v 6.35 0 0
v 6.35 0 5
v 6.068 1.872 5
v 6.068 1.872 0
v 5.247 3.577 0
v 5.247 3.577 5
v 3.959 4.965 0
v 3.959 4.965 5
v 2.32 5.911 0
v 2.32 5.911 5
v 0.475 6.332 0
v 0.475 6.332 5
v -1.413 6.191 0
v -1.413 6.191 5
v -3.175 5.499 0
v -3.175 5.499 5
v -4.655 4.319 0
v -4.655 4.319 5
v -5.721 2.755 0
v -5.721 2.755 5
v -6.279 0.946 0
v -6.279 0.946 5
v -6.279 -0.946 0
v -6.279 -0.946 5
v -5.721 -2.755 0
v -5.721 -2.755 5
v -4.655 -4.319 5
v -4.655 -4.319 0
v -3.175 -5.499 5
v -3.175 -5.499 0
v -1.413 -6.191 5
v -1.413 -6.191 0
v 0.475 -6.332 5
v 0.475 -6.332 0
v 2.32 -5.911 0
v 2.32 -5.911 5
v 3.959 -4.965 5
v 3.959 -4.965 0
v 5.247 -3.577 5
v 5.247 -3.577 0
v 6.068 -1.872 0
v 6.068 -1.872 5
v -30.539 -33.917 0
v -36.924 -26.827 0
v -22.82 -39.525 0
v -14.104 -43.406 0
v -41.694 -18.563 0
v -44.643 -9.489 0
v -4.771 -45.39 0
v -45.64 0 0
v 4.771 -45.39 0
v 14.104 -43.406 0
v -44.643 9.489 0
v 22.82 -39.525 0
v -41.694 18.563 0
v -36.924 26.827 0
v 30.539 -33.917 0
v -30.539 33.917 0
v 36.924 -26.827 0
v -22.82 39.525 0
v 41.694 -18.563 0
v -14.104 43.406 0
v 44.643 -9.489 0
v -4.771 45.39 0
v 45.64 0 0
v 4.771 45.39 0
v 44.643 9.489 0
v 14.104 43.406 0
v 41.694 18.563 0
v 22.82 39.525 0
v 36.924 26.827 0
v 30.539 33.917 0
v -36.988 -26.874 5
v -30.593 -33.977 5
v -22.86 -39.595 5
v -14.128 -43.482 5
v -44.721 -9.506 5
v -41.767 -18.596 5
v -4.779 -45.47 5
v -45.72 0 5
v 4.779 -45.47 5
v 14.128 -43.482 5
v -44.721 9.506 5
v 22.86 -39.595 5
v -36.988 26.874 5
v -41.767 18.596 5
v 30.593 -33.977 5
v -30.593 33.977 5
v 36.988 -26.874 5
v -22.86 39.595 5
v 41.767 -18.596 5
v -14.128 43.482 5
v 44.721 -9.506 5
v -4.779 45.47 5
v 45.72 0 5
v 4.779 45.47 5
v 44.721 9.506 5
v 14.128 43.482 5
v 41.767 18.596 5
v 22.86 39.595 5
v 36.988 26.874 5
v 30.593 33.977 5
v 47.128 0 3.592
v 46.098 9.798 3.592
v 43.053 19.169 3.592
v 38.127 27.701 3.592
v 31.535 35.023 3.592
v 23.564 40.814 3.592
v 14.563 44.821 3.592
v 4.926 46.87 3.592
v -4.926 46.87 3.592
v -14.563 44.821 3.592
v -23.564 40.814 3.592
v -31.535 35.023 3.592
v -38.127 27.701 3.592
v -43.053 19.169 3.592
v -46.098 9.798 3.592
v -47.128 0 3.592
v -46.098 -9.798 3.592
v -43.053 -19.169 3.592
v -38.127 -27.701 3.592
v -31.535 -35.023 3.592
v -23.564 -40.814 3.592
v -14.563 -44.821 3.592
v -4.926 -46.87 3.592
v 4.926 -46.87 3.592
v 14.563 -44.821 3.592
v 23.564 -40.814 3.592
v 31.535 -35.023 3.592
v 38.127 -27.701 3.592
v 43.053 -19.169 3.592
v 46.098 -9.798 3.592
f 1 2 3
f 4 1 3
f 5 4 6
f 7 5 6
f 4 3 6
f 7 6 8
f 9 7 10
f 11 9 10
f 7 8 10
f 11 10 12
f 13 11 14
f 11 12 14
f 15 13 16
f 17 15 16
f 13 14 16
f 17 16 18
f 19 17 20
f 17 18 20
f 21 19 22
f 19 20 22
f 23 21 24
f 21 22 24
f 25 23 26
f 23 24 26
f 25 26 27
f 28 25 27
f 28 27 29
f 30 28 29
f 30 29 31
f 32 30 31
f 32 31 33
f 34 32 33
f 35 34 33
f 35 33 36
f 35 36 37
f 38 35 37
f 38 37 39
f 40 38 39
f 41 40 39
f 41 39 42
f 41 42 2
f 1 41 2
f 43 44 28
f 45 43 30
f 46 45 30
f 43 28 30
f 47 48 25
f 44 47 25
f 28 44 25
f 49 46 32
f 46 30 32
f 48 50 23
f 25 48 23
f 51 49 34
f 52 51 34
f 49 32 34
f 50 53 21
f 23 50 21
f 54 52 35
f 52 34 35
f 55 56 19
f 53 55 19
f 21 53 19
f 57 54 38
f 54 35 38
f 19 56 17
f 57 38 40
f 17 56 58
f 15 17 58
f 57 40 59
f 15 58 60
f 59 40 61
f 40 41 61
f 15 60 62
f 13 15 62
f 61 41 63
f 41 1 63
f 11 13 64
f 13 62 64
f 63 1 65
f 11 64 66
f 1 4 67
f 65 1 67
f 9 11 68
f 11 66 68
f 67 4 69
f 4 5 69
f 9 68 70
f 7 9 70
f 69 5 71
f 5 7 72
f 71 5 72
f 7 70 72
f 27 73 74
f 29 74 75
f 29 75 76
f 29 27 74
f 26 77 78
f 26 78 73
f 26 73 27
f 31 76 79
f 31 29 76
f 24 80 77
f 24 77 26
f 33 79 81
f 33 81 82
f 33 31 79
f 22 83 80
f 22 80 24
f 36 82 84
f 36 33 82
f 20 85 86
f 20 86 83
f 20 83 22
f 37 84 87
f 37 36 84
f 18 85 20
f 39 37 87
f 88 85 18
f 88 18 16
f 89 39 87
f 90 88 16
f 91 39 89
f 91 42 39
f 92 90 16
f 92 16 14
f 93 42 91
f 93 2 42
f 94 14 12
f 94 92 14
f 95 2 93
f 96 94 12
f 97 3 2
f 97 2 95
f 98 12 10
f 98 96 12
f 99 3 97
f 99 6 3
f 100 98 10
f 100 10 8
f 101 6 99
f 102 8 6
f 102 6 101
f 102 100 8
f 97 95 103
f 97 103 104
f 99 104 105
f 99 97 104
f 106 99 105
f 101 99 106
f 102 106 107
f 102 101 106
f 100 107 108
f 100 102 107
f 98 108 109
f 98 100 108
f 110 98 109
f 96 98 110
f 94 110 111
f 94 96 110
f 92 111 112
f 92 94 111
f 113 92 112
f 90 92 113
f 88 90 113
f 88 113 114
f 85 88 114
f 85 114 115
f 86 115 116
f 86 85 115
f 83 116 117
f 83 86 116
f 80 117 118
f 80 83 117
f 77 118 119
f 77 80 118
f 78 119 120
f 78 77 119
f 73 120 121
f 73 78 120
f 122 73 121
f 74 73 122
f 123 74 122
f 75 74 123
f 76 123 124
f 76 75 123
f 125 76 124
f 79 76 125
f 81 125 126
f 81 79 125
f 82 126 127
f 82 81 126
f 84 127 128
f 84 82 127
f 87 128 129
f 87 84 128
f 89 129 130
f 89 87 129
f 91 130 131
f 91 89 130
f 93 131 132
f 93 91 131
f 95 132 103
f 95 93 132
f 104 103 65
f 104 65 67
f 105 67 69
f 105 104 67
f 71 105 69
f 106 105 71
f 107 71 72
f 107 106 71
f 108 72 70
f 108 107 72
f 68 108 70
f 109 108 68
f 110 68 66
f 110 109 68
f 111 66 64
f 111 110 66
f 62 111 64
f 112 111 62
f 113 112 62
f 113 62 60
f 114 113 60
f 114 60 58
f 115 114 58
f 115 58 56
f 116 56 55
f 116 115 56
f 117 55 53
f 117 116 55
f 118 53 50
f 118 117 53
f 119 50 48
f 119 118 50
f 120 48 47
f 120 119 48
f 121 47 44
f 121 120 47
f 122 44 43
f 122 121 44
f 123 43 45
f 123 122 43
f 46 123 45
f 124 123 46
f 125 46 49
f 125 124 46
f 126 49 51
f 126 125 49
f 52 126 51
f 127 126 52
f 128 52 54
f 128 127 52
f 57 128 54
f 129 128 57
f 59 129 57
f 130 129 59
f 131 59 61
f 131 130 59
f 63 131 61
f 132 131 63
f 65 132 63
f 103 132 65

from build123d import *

# Parameters (mm, degrees)
F0_R     = 50.8
F1_DEPTH = 5
F2_R     = 6.35
F3_DEPTH = 5.001
F5_SIZE  = 5.08


# Not quite as in the source:
# - a fillet or chamfer that OpenCascade refuses, or shapes differently, is made with other operations: its cross-section is extruded or revolved along the edge and cut away or added


with BuildPart() as f1:
    # F0 (on Top) → F1 (new body)
    with BuildSketch(Plane.XY):
        Circle(F0_R)
    extrude(amount=F1_DEPTH)

    # F2 (on face) → F3 (cut, through all)
    with BuildSketch(Plane.XY.offset(5)):
        Circle(F2_R)
    extrude(amount=-F3_DEPTH, mode=Mode.SUBTRACT)

    # F4: chamfer of 5.08 on 1 edges, made by hand

    # F4_s1 → F4_t2 (revolve, cut)
    with BuildSketch(Plane.XZ):
        Polygon((50.8, -0.08), (45.72, 5), (50.8, 5), align=None)
    revolve(axis=Axis((0, 0, 5), (0, 0, 1)), mode=Mode.SUBTRACT)

    # F5
    f5_edges = [f1.edges().sort_by_distance(p)[0] for p in [
        (-50.72, 0, 0),
    ]]
    chamfer(f5_edges, length=F5_SIZE)


solid = f1.part
